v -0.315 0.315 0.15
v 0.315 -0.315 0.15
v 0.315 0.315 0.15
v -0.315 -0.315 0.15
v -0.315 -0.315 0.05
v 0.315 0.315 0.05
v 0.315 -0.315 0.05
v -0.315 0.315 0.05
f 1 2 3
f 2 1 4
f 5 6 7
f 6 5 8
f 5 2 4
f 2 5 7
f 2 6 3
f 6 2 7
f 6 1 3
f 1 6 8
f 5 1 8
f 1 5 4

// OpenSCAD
use <lib.scad>

module finsHD() {
	difference() {
		box([0.6,0.6,0.6]);
		for (i = [-3:1:3]) translate([0,0.082*i,0.2]) box([0.7,0.05,0.6]);
		translate([0,0,0.2]) box([0.05,0.7,0.6]);
	}
}

module finsLD() {
	difference() {
		box([0.6,0.6,0.6]);
		for (i = [-1:1:1]) translate([0,0.175*i,0.2]) box([0.7,0.1,0.6]);
	}
}

module baseHD() {
	translate([0,0,-0.2]) union() {
		box([0.63,0.55,0.1]);
		box([0.55,0.63,0.1]);
	}
}

module baseLD() {
	translate([0,0,-0.2])
		box([0.63,0.63,0.1]);
}

//translate([0,0,0.3]) finsHD();
//translate([0,0,0.3]) baseHD();

//translate([0,0,0.3]) finsLD();
translate([0,0,0.3]) baseLD();
